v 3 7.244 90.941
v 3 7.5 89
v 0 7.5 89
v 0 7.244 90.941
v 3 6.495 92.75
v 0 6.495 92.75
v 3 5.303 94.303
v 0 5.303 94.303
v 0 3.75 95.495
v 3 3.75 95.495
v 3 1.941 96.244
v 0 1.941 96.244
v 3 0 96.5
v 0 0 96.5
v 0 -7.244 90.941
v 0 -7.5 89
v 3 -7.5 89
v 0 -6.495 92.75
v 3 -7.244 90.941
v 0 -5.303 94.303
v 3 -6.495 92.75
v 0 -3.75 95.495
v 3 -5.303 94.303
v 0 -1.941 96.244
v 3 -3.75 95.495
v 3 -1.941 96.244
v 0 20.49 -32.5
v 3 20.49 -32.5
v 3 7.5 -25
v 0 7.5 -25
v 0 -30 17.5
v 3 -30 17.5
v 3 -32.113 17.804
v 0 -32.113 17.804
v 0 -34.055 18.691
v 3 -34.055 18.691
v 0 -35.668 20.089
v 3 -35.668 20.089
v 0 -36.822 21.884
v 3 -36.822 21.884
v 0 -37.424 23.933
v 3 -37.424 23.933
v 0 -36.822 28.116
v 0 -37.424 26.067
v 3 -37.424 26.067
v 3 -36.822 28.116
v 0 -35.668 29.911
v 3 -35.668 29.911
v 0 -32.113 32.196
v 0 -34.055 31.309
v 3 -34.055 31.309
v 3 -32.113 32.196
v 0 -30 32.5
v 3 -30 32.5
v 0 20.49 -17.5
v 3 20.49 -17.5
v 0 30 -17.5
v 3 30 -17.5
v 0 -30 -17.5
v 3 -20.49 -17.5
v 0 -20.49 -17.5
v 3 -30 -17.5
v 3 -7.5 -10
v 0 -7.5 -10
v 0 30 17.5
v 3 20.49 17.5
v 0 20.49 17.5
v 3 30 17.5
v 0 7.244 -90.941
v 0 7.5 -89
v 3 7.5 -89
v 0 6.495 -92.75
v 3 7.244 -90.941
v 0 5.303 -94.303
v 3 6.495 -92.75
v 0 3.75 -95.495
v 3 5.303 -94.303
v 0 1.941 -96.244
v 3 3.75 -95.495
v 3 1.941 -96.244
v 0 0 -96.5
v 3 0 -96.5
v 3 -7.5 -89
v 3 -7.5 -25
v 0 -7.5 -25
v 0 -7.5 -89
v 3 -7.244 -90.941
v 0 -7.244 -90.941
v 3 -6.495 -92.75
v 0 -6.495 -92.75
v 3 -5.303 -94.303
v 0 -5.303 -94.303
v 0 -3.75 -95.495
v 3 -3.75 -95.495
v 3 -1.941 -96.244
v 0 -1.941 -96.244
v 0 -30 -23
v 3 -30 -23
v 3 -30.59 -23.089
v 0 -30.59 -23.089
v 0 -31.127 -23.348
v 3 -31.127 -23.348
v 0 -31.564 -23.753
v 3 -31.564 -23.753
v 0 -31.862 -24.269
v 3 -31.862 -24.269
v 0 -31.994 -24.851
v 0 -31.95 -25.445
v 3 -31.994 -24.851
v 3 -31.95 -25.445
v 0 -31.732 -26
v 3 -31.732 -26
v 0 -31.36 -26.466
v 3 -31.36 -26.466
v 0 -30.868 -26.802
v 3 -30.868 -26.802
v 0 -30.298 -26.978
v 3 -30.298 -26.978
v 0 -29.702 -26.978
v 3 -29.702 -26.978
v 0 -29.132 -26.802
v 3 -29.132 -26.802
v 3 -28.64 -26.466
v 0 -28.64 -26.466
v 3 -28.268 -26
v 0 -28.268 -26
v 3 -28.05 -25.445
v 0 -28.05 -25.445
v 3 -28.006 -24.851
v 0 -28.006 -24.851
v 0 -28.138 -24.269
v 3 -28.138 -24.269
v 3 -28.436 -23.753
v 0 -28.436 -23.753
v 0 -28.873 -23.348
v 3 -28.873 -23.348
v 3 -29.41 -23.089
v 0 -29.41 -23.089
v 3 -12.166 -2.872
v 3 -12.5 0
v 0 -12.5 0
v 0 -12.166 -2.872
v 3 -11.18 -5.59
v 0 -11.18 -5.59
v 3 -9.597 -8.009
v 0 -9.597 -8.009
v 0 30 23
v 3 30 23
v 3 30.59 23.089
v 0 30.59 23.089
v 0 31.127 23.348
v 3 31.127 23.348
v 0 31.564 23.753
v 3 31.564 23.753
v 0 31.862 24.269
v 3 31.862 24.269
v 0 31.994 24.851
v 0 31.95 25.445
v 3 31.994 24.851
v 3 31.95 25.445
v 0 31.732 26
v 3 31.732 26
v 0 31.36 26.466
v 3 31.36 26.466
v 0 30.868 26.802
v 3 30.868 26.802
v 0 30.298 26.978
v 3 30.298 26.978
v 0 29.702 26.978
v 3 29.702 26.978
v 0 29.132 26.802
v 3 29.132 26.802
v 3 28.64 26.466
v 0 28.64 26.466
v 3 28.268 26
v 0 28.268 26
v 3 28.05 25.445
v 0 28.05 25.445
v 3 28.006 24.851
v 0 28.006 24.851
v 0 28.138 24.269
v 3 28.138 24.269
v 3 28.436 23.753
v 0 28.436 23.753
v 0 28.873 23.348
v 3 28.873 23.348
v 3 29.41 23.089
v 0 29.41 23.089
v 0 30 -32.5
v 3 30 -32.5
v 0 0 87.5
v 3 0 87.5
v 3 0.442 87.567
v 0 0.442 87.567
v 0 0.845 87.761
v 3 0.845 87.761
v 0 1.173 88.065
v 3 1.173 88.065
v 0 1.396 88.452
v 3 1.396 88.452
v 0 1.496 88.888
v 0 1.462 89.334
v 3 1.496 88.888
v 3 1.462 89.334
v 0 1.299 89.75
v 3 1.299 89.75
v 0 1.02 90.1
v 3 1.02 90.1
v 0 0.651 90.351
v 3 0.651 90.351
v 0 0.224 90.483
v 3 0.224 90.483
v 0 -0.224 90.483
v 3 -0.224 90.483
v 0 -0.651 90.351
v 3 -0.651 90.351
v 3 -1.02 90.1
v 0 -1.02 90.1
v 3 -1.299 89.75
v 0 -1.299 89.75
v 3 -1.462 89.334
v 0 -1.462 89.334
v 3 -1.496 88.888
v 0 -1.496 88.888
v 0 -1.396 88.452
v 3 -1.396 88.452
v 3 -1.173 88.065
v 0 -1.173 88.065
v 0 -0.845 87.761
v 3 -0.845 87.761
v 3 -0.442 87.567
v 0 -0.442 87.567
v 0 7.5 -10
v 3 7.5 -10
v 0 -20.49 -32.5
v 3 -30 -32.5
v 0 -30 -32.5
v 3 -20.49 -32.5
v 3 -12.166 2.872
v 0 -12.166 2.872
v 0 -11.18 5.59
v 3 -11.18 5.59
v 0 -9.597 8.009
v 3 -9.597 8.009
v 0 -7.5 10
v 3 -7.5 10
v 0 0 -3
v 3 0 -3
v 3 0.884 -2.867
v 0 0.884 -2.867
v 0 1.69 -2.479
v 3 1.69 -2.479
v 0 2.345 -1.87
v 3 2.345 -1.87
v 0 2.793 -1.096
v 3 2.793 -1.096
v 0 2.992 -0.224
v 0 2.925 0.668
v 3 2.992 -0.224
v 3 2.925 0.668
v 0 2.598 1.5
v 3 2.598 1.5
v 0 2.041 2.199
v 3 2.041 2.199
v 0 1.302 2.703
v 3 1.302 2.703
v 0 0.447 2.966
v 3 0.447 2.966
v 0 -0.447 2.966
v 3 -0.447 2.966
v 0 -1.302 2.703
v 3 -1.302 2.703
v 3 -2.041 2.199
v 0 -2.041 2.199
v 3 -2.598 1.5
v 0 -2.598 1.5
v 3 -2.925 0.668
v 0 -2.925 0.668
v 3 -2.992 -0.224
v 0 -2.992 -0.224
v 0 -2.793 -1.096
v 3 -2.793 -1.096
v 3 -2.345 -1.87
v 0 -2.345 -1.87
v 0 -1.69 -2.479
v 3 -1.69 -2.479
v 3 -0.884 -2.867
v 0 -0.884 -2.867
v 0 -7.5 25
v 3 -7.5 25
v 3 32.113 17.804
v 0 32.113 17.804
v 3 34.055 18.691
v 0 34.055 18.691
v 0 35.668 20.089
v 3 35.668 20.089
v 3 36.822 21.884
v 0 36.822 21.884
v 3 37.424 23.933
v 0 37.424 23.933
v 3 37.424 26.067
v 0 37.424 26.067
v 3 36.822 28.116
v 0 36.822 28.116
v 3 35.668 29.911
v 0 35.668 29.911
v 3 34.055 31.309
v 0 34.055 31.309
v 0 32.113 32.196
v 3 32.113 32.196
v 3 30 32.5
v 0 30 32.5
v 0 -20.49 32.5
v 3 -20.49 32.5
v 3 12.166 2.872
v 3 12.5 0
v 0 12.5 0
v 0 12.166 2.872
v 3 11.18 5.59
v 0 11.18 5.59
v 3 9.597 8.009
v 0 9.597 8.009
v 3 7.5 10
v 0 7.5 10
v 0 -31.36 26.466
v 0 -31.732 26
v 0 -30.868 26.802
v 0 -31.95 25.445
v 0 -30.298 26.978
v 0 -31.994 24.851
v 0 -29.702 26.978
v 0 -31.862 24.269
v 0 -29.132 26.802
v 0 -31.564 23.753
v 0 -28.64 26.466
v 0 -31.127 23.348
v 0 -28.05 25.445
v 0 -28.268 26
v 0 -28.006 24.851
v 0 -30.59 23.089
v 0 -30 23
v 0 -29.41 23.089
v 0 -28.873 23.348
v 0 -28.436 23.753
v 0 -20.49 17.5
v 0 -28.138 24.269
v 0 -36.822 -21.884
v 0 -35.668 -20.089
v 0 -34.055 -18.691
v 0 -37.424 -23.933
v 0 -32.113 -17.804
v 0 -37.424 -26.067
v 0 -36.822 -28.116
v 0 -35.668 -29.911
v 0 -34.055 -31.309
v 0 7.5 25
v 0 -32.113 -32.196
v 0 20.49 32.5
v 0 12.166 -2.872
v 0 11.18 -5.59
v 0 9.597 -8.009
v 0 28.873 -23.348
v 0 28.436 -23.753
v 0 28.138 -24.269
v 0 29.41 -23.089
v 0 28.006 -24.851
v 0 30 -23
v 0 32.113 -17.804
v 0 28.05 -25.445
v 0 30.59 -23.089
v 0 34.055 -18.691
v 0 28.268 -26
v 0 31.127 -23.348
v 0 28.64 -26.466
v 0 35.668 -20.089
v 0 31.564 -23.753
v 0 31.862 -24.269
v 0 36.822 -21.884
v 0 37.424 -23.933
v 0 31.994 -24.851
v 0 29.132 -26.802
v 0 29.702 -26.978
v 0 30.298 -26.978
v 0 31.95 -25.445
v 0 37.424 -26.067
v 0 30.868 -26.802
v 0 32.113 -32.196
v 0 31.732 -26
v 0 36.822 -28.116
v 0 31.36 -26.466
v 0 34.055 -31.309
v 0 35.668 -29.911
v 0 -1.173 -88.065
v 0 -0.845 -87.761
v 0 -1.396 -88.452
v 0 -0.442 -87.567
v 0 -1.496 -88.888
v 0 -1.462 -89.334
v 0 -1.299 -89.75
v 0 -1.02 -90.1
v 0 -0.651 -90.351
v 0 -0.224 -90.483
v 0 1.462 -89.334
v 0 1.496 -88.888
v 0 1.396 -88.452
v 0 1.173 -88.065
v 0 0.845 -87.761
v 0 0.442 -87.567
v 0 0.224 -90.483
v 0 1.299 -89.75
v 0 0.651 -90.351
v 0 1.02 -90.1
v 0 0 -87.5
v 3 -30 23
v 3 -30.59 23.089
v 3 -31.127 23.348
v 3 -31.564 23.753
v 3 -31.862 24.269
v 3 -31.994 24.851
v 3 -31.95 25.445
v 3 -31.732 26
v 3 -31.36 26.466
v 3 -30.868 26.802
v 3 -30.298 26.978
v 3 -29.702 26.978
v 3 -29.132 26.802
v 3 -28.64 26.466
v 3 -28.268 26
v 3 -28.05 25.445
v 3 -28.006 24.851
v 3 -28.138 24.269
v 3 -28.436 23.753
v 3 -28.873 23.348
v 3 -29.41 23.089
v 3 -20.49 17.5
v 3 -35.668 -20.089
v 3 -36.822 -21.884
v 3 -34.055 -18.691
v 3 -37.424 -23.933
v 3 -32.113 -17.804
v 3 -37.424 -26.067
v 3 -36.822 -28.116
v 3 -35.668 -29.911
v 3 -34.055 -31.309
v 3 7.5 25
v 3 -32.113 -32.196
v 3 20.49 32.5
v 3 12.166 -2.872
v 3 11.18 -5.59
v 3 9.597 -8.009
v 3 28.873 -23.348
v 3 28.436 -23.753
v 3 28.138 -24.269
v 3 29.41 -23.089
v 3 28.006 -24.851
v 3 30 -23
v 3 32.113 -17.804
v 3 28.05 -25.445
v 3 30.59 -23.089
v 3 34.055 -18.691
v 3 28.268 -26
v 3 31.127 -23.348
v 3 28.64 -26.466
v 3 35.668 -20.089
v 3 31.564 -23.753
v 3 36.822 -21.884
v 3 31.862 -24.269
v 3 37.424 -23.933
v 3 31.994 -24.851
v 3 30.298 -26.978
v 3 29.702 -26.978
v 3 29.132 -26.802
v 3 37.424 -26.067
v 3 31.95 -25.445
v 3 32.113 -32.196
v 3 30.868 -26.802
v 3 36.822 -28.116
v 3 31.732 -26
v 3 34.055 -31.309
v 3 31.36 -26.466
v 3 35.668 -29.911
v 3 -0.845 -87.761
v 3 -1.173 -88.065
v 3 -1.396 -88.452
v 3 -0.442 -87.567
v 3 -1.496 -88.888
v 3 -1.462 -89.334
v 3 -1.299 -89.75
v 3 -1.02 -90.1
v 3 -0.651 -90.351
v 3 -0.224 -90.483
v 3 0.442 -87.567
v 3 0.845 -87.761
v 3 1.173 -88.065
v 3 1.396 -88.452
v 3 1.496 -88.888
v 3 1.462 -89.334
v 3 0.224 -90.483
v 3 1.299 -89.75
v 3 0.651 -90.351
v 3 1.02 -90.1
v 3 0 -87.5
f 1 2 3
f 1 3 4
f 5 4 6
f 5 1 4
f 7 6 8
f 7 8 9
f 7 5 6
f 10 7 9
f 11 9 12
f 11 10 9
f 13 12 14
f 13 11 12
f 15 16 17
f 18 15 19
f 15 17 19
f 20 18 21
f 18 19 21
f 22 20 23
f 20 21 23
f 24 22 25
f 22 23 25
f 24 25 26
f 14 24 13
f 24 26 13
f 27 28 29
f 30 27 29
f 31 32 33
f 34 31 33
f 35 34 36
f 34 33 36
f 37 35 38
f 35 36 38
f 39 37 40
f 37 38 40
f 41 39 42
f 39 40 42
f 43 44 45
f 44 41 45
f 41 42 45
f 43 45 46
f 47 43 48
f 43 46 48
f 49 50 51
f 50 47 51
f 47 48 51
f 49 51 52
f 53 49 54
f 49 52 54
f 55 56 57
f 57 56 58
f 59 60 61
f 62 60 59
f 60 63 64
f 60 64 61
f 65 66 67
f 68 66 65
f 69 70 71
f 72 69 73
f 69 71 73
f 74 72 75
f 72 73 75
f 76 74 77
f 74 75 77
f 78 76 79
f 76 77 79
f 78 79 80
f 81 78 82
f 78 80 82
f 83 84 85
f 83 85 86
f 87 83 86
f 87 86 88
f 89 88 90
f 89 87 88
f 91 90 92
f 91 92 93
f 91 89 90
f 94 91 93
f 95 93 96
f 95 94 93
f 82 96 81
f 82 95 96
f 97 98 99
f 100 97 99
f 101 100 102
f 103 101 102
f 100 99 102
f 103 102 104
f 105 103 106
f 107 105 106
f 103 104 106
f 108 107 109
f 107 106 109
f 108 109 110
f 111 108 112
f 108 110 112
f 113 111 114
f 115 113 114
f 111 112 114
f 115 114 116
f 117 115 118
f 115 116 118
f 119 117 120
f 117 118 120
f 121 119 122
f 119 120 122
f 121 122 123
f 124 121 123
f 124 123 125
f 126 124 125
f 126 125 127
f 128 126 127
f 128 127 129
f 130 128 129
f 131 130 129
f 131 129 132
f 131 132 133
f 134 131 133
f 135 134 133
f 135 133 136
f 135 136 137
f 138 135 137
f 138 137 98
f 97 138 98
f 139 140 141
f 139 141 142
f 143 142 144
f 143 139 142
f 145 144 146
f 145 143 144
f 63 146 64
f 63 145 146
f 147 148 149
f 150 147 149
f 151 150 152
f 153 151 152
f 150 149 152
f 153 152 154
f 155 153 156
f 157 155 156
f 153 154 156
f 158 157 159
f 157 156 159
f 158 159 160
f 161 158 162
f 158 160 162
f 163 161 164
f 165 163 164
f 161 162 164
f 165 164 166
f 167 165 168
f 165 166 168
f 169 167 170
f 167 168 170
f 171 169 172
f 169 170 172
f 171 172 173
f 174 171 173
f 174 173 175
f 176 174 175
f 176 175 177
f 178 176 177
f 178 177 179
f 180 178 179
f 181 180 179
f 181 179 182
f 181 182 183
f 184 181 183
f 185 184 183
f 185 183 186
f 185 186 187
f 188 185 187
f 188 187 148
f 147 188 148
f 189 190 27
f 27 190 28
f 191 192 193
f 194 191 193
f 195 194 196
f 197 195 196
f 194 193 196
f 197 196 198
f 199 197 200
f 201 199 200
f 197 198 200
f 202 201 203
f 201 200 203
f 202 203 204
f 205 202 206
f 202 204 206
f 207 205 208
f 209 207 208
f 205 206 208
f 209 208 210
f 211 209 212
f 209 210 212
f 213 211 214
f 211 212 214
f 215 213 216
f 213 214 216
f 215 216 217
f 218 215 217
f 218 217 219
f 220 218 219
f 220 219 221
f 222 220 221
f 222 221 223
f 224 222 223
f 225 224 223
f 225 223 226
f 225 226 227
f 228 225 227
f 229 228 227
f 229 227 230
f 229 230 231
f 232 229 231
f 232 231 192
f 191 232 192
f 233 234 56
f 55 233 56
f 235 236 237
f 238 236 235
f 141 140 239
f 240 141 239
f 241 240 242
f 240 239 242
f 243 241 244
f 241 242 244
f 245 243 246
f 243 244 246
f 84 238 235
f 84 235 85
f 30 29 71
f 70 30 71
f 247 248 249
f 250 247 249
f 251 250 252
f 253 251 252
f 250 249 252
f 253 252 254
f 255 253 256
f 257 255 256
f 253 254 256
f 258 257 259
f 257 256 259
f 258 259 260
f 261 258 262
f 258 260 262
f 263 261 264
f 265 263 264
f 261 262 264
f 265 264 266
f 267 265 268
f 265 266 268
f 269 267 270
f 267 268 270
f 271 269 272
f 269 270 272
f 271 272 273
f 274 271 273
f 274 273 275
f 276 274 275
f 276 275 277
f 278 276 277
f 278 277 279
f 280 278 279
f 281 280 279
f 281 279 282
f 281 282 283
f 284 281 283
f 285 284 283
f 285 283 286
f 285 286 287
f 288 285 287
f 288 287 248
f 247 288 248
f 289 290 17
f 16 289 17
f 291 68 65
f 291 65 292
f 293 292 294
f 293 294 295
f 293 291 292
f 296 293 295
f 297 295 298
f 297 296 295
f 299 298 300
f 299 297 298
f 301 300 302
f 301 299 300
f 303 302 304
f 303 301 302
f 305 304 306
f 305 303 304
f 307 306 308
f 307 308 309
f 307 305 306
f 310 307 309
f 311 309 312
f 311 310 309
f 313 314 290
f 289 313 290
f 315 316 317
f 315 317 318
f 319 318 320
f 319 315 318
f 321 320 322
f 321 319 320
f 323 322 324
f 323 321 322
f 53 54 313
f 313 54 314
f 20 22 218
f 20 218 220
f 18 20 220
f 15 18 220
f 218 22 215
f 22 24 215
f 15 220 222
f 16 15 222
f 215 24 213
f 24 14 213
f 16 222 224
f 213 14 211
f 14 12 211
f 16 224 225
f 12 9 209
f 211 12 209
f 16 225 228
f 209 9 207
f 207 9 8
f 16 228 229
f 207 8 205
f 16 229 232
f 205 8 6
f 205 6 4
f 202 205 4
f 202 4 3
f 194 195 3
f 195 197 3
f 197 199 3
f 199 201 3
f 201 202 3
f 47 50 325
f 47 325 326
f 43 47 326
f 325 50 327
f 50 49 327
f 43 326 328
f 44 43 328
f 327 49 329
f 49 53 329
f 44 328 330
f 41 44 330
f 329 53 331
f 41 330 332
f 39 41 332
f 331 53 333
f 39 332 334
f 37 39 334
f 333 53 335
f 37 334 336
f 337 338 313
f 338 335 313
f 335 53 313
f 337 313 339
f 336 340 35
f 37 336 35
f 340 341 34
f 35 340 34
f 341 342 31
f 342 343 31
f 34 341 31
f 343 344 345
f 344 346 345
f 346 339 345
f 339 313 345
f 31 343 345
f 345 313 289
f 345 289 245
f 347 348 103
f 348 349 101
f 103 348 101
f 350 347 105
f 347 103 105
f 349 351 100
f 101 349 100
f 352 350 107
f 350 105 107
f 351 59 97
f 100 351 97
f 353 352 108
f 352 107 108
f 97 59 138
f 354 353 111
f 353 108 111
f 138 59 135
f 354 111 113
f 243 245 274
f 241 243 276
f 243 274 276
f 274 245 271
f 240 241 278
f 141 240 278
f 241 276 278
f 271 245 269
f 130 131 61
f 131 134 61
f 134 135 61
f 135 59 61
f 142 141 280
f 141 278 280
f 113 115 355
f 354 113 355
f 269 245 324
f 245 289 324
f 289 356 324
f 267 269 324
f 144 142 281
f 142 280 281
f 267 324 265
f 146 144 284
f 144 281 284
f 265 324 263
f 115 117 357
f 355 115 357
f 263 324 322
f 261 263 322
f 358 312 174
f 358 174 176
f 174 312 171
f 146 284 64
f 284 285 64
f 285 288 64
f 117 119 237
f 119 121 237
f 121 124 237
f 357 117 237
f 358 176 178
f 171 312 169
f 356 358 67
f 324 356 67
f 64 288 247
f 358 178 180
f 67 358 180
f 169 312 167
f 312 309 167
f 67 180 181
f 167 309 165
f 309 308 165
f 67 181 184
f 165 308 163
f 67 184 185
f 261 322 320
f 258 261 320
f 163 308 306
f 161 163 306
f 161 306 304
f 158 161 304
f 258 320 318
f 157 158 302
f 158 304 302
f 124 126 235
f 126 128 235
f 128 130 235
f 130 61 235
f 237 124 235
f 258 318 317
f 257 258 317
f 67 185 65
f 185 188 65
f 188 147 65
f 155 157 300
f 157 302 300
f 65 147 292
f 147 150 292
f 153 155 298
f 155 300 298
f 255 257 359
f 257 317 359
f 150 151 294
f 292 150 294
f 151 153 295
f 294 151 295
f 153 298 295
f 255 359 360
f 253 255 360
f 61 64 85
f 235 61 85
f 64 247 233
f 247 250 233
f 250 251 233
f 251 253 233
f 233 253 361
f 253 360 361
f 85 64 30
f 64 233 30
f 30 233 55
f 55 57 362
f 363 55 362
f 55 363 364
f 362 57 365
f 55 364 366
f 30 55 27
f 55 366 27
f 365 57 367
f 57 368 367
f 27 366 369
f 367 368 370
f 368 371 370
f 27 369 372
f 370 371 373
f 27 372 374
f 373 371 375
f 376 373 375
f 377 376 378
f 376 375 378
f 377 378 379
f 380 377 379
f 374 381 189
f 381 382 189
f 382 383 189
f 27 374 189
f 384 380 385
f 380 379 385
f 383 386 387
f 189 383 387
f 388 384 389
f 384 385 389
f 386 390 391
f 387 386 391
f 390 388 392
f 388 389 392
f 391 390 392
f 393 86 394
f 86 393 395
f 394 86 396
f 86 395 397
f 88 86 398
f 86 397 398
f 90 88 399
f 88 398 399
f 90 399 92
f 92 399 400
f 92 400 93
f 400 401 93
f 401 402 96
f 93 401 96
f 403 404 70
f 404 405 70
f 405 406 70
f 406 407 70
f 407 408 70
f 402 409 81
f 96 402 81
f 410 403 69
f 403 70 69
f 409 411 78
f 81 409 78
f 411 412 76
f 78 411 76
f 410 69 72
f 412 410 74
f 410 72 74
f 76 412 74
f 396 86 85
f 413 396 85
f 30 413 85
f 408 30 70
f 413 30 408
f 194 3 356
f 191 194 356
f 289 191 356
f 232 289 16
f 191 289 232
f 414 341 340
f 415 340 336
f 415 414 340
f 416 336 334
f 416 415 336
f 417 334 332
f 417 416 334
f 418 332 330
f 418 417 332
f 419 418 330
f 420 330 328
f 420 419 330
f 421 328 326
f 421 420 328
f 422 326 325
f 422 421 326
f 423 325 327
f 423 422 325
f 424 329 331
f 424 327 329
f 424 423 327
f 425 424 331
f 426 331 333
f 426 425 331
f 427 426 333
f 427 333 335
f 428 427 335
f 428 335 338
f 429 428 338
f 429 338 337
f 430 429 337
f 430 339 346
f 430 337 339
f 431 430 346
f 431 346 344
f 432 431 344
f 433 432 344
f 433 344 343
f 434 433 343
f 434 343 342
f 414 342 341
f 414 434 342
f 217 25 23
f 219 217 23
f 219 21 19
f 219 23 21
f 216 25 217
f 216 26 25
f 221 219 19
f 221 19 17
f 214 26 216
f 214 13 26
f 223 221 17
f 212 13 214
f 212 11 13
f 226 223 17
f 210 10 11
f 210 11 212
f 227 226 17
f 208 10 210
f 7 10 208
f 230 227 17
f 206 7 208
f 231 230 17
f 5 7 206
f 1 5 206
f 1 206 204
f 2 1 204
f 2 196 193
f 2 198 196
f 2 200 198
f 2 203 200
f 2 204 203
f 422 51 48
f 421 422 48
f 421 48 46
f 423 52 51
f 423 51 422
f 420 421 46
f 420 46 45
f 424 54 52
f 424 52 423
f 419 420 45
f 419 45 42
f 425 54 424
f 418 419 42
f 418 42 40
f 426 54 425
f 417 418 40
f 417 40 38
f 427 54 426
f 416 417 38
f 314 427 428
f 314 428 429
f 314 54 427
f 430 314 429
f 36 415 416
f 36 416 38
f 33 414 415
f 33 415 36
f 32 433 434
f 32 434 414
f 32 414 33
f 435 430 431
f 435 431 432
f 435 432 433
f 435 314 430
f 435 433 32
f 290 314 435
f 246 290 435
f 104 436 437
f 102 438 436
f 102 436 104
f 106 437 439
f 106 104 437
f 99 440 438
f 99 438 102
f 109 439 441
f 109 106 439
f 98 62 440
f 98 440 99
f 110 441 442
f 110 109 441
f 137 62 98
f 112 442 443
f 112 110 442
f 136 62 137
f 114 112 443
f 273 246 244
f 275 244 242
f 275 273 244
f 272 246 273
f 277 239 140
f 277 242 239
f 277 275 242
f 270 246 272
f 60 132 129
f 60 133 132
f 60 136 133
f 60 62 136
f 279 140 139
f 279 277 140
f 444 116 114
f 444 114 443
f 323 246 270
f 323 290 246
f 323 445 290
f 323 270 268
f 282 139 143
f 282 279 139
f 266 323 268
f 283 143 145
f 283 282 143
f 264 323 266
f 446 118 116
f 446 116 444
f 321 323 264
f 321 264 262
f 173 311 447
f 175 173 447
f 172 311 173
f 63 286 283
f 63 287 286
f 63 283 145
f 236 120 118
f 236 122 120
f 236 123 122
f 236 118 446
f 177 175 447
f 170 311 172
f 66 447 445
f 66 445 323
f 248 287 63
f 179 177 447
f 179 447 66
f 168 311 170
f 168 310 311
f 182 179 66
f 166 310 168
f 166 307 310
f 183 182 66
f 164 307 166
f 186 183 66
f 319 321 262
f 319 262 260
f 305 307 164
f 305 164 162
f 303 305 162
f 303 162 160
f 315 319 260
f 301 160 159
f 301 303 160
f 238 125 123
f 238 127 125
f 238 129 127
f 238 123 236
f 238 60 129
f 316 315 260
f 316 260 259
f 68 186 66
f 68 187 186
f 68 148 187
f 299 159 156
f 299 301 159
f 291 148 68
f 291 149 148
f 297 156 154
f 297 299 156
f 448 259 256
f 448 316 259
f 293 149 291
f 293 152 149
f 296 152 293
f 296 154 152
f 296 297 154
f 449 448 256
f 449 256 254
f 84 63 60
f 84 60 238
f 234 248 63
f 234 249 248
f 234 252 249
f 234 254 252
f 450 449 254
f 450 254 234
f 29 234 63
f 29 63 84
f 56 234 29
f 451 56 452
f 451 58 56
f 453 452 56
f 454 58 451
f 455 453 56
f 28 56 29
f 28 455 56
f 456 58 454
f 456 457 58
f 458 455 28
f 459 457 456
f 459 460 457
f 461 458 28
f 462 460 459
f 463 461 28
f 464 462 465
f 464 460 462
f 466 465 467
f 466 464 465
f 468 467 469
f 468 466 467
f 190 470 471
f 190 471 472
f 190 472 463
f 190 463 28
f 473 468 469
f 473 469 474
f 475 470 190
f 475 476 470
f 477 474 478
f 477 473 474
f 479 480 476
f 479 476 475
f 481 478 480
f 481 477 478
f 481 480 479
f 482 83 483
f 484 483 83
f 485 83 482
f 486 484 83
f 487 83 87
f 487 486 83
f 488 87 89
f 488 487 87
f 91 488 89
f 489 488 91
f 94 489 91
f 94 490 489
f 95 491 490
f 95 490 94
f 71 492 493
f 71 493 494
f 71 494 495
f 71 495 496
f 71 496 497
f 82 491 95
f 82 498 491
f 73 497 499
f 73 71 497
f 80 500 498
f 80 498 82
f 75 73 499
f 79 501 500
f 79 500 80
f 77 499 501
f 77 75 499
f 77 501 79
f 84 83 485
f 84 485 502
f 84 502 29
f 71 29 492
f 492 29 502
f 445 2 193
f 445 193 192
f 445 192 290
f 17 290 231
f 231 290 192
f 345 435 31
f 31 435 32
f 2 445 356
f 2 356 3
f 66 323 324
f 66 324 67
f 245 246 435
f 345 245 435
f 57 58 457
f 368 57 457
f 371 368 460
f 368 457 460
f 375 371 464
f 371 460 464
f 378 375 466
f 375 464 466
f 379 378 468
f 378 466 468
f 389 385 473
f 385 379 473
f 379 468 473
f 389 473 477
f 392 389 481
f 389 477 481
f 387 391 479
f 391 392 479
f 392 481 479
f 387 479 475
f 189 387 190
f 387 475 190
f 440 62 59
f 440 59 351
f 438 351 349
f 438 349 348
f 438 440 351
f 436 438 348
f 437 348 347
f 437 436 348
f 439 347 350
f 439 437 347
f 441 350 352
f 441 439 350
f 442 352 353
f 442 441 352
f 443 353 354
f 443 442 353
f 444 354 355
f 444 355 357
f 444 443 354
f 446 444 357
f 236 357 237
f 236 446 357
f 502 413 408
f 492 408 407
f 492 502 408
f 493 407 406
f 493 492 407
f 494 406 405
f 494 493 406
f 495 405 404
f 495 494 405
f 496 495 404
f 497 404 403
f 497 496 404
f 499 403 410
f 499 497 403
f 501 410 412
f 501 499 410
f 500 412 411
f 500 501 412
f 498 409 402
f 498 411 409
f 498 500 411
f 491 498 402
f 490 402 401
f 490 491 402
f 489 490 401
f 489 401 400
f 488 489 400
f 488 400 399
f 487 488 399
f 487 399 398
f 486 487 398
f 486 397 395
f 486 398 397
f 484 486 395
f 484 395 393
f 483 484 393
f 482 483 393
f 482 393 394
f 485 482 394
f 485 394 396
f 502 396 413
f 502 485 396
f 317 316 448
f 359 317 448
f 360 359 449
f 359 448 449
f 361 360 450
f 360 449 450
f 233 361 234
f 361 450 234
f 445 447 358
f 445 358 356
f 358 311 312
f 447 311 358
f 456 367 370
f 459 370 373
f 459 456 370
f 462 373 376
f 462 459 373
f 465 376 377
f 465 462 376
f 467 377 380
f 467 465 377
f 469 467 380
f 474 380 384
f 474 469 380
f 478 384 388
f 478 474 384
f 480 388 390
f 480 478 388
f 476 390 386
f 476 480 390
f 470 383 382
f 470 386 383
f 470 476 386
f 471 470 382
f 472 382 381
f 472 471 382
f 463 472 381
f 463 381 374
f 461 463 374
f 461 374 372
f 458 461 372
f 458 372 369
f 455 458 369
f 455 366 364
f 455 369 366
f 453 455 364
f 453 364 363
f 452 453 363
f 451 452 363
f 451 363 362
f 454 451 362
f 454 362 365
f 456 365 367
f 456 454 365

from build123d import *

# Parameters (mm, degrees)
SKETCH1_W               = 210
SKETCH1_H               = 90
BOSS_EXTRUDE1_DEPTH     = 3
SKETCH2_R               = 1.5
CUT_EXTRUDE1_DEPTH      = 4
SKETCH3_R               = 2
CUT_EXTRUDE2_DEPTH      = 4
CUT_EXTRUDE3_DEPTH      = 4
MIRROR3_COPY_1_SKETCH_R = 2
MIRROR3_COPY_1_DEPTH    = 4
MIRROR3_COPY_2_DEPTH    = 4
SKETCH5_R               = 3
CUT_EXTRUDE4_DEPTH      = 4


with BuildPart() as part:
    # Sketch1 → Boss-Extrude1 (new body)
    with BuildSketch(Plane(origin=(0, 0, 0), x_dir=(0, 0, -1), z_dir=(1, 0, 0))):
        Rectangle(SKETCH1_W, SKETCH1_H)
    extrude(amount=BOSS_EXTRUDE1_DEPTH)

    # Sketch2 → Cut-Extrude1 (cut, through all)
    with BuildSketch(Plane(origin=(3, 0, 0), x_dir=(0, 0, -1), z_dir=(1, 0, 0))):
        with Locations((-89, 0)):
            Circle(SKETCH2_R)
    cut_extrude1 = extrude(amount=-CUT_EXTRUDE1_DEPTH, mode=Mode.SUBTRACT)

    # Sketch3 → Cut-Extrude2 (cut, through all)
    with BuildSketch(Plane(origin=(3, 0, 0), x_dir=(0, 0, -1), z_dir=(1, 0, 0))):
        with Locations((-25, 30)):
            Circle(SKETCH3_R)
    cut_extrude2 = extrude(amount=-CUT_EXTRUDE2_DEPTH, mode=Mode.SUBTRACT)

    # Sketch4 → Cut-Extrude3 (cut, through all)
    with BuildSketch(Plane(origin=(3, 0, 0), x_dir=(0, 0, -1), z_dir=(1, 0, 0))):
        with BuildLine():
            Line((-105, 0), (-105, 45))
            Line((-105, 45), (0, 45))
            Line((0, 45), (0, 40))
            Line((0, 40), (0, 12.5))
            ThreePointArc((0, 12.5), (-5.590169944, 11.180339887), (-10, 7.5))
            Line((-10, 7.5), (-17.5, 20.490381057))
            Line((-17.5, 20.490381057), (-17.5, 30))
            ThreePointArc((-17.5, 30), (-25, 37.5), (-32.5, 30))
            Line((-32.5, 30), (-32.5, 20.490381057))
            Line((-32.5, 20.490381057), (-25, 7.5))
            Line((-25, 7.5), (-89, 7.5))
            ThreePointArc((-89, 7.5), (-94.303300859, 5.303300859), (-96.5, 0))
            Line((-96.5, 0), (-105, 0))
        make_face()
    cut_extrude3 = extrude(amount=-CUT_EXTRUDE3_DEPTH, mode=Mode.SUBTRACT)

    # Mirror2: Cut-Extrude2, Cut-Extrude3 across plane
    add(cut_extrude2.mirror(Plane.ZX), mode=Mode.SUBTRACT)
    add(cut_extrude3.mirror(Plane.ZX), mode=Mode.SUBTRACT)

    # Mirror3: Cut-Extrude3, Cut-Extrude1, Cut-Extrude2 across plane
    add(cut_extrude3.mirror(Plane.XY), mode=Mode.SUBTRACT)
    add(cut_extrude1.mirror(Plane.XY), mode=Mode.SUBTRACT)
    add(cut_extrude2.mirror(Plane.XY), mode=Mode.SUBTRACT)

    # Mirror3 copy 1 sketch → Mirror3 copy 1 (cut, through all)
    with BuildSketch(Plane(origin=(3, 0, 0), x_dir=(0, 0, 1), z_dir=(1, 0, 0))):
        with Locations((-25, 30)):
            Circle(MIRROR3_COPY_1_SKETCH_R)
    extrude(amount=-MIRROR3_COPY_1_DEPTH, mode=Mode.SUBTRACT)

    # Mirror3 copy 2 sketch → Mirror3 copy 2 (cut, through all)
    with BuildSketch(Plane(origin=(3, 0, 0), x_dir=(0, 0, 1), z_dir=(1, 0, 0))):
        with BuildLine():
            Line((-105, 0), (-105, 45))
            Line((-105, 45), (0, 45))
            Line((0, 45), (0, 40))
            Line((0, 40), (0, 12.5))
            ThreePointArc((0, 12.5), (-5.590169944, 11.180339887), (-10, 7.5))
            Line((-10, 7.5), (-17.5, 20.490381057))
            Line((-17.5, 20.490381057), (-17.5, 30))
            ThreePointArc((-17.5, 30), (-25, 37.5), (-32.5, 30))
            Line((-32.5, 30), (-32.5, 20.490381057))
            Line((-32.5, 20.490381057), (-25, 7.5))
            Line((-25, 7.5), (-89, 7.5))
            ThreePointArc((-89, 7.5), (-94.303300859, 5.303300859), (-96.5, 0))
            Line((-96.5, 0), (-105, 0))
        make_face()
    extrude(amount=-MIRROR3_COPY_2_DEPTH, mode=Mode.SUBTRACT)

    # Sketch5 → Cut-Extrude4 (cut, through all)
    with BuildSketch(Plane(origin=(3, 0, 0), x_dir=(0, 0, -1), z_dir=(1, 0, 0))):
        Circle(SKETCH5_R)
    extrude(amount=-CUT_EXTRUDE4_DEPTH, mode=Mode.SUBTRACT)


solid = part.part
